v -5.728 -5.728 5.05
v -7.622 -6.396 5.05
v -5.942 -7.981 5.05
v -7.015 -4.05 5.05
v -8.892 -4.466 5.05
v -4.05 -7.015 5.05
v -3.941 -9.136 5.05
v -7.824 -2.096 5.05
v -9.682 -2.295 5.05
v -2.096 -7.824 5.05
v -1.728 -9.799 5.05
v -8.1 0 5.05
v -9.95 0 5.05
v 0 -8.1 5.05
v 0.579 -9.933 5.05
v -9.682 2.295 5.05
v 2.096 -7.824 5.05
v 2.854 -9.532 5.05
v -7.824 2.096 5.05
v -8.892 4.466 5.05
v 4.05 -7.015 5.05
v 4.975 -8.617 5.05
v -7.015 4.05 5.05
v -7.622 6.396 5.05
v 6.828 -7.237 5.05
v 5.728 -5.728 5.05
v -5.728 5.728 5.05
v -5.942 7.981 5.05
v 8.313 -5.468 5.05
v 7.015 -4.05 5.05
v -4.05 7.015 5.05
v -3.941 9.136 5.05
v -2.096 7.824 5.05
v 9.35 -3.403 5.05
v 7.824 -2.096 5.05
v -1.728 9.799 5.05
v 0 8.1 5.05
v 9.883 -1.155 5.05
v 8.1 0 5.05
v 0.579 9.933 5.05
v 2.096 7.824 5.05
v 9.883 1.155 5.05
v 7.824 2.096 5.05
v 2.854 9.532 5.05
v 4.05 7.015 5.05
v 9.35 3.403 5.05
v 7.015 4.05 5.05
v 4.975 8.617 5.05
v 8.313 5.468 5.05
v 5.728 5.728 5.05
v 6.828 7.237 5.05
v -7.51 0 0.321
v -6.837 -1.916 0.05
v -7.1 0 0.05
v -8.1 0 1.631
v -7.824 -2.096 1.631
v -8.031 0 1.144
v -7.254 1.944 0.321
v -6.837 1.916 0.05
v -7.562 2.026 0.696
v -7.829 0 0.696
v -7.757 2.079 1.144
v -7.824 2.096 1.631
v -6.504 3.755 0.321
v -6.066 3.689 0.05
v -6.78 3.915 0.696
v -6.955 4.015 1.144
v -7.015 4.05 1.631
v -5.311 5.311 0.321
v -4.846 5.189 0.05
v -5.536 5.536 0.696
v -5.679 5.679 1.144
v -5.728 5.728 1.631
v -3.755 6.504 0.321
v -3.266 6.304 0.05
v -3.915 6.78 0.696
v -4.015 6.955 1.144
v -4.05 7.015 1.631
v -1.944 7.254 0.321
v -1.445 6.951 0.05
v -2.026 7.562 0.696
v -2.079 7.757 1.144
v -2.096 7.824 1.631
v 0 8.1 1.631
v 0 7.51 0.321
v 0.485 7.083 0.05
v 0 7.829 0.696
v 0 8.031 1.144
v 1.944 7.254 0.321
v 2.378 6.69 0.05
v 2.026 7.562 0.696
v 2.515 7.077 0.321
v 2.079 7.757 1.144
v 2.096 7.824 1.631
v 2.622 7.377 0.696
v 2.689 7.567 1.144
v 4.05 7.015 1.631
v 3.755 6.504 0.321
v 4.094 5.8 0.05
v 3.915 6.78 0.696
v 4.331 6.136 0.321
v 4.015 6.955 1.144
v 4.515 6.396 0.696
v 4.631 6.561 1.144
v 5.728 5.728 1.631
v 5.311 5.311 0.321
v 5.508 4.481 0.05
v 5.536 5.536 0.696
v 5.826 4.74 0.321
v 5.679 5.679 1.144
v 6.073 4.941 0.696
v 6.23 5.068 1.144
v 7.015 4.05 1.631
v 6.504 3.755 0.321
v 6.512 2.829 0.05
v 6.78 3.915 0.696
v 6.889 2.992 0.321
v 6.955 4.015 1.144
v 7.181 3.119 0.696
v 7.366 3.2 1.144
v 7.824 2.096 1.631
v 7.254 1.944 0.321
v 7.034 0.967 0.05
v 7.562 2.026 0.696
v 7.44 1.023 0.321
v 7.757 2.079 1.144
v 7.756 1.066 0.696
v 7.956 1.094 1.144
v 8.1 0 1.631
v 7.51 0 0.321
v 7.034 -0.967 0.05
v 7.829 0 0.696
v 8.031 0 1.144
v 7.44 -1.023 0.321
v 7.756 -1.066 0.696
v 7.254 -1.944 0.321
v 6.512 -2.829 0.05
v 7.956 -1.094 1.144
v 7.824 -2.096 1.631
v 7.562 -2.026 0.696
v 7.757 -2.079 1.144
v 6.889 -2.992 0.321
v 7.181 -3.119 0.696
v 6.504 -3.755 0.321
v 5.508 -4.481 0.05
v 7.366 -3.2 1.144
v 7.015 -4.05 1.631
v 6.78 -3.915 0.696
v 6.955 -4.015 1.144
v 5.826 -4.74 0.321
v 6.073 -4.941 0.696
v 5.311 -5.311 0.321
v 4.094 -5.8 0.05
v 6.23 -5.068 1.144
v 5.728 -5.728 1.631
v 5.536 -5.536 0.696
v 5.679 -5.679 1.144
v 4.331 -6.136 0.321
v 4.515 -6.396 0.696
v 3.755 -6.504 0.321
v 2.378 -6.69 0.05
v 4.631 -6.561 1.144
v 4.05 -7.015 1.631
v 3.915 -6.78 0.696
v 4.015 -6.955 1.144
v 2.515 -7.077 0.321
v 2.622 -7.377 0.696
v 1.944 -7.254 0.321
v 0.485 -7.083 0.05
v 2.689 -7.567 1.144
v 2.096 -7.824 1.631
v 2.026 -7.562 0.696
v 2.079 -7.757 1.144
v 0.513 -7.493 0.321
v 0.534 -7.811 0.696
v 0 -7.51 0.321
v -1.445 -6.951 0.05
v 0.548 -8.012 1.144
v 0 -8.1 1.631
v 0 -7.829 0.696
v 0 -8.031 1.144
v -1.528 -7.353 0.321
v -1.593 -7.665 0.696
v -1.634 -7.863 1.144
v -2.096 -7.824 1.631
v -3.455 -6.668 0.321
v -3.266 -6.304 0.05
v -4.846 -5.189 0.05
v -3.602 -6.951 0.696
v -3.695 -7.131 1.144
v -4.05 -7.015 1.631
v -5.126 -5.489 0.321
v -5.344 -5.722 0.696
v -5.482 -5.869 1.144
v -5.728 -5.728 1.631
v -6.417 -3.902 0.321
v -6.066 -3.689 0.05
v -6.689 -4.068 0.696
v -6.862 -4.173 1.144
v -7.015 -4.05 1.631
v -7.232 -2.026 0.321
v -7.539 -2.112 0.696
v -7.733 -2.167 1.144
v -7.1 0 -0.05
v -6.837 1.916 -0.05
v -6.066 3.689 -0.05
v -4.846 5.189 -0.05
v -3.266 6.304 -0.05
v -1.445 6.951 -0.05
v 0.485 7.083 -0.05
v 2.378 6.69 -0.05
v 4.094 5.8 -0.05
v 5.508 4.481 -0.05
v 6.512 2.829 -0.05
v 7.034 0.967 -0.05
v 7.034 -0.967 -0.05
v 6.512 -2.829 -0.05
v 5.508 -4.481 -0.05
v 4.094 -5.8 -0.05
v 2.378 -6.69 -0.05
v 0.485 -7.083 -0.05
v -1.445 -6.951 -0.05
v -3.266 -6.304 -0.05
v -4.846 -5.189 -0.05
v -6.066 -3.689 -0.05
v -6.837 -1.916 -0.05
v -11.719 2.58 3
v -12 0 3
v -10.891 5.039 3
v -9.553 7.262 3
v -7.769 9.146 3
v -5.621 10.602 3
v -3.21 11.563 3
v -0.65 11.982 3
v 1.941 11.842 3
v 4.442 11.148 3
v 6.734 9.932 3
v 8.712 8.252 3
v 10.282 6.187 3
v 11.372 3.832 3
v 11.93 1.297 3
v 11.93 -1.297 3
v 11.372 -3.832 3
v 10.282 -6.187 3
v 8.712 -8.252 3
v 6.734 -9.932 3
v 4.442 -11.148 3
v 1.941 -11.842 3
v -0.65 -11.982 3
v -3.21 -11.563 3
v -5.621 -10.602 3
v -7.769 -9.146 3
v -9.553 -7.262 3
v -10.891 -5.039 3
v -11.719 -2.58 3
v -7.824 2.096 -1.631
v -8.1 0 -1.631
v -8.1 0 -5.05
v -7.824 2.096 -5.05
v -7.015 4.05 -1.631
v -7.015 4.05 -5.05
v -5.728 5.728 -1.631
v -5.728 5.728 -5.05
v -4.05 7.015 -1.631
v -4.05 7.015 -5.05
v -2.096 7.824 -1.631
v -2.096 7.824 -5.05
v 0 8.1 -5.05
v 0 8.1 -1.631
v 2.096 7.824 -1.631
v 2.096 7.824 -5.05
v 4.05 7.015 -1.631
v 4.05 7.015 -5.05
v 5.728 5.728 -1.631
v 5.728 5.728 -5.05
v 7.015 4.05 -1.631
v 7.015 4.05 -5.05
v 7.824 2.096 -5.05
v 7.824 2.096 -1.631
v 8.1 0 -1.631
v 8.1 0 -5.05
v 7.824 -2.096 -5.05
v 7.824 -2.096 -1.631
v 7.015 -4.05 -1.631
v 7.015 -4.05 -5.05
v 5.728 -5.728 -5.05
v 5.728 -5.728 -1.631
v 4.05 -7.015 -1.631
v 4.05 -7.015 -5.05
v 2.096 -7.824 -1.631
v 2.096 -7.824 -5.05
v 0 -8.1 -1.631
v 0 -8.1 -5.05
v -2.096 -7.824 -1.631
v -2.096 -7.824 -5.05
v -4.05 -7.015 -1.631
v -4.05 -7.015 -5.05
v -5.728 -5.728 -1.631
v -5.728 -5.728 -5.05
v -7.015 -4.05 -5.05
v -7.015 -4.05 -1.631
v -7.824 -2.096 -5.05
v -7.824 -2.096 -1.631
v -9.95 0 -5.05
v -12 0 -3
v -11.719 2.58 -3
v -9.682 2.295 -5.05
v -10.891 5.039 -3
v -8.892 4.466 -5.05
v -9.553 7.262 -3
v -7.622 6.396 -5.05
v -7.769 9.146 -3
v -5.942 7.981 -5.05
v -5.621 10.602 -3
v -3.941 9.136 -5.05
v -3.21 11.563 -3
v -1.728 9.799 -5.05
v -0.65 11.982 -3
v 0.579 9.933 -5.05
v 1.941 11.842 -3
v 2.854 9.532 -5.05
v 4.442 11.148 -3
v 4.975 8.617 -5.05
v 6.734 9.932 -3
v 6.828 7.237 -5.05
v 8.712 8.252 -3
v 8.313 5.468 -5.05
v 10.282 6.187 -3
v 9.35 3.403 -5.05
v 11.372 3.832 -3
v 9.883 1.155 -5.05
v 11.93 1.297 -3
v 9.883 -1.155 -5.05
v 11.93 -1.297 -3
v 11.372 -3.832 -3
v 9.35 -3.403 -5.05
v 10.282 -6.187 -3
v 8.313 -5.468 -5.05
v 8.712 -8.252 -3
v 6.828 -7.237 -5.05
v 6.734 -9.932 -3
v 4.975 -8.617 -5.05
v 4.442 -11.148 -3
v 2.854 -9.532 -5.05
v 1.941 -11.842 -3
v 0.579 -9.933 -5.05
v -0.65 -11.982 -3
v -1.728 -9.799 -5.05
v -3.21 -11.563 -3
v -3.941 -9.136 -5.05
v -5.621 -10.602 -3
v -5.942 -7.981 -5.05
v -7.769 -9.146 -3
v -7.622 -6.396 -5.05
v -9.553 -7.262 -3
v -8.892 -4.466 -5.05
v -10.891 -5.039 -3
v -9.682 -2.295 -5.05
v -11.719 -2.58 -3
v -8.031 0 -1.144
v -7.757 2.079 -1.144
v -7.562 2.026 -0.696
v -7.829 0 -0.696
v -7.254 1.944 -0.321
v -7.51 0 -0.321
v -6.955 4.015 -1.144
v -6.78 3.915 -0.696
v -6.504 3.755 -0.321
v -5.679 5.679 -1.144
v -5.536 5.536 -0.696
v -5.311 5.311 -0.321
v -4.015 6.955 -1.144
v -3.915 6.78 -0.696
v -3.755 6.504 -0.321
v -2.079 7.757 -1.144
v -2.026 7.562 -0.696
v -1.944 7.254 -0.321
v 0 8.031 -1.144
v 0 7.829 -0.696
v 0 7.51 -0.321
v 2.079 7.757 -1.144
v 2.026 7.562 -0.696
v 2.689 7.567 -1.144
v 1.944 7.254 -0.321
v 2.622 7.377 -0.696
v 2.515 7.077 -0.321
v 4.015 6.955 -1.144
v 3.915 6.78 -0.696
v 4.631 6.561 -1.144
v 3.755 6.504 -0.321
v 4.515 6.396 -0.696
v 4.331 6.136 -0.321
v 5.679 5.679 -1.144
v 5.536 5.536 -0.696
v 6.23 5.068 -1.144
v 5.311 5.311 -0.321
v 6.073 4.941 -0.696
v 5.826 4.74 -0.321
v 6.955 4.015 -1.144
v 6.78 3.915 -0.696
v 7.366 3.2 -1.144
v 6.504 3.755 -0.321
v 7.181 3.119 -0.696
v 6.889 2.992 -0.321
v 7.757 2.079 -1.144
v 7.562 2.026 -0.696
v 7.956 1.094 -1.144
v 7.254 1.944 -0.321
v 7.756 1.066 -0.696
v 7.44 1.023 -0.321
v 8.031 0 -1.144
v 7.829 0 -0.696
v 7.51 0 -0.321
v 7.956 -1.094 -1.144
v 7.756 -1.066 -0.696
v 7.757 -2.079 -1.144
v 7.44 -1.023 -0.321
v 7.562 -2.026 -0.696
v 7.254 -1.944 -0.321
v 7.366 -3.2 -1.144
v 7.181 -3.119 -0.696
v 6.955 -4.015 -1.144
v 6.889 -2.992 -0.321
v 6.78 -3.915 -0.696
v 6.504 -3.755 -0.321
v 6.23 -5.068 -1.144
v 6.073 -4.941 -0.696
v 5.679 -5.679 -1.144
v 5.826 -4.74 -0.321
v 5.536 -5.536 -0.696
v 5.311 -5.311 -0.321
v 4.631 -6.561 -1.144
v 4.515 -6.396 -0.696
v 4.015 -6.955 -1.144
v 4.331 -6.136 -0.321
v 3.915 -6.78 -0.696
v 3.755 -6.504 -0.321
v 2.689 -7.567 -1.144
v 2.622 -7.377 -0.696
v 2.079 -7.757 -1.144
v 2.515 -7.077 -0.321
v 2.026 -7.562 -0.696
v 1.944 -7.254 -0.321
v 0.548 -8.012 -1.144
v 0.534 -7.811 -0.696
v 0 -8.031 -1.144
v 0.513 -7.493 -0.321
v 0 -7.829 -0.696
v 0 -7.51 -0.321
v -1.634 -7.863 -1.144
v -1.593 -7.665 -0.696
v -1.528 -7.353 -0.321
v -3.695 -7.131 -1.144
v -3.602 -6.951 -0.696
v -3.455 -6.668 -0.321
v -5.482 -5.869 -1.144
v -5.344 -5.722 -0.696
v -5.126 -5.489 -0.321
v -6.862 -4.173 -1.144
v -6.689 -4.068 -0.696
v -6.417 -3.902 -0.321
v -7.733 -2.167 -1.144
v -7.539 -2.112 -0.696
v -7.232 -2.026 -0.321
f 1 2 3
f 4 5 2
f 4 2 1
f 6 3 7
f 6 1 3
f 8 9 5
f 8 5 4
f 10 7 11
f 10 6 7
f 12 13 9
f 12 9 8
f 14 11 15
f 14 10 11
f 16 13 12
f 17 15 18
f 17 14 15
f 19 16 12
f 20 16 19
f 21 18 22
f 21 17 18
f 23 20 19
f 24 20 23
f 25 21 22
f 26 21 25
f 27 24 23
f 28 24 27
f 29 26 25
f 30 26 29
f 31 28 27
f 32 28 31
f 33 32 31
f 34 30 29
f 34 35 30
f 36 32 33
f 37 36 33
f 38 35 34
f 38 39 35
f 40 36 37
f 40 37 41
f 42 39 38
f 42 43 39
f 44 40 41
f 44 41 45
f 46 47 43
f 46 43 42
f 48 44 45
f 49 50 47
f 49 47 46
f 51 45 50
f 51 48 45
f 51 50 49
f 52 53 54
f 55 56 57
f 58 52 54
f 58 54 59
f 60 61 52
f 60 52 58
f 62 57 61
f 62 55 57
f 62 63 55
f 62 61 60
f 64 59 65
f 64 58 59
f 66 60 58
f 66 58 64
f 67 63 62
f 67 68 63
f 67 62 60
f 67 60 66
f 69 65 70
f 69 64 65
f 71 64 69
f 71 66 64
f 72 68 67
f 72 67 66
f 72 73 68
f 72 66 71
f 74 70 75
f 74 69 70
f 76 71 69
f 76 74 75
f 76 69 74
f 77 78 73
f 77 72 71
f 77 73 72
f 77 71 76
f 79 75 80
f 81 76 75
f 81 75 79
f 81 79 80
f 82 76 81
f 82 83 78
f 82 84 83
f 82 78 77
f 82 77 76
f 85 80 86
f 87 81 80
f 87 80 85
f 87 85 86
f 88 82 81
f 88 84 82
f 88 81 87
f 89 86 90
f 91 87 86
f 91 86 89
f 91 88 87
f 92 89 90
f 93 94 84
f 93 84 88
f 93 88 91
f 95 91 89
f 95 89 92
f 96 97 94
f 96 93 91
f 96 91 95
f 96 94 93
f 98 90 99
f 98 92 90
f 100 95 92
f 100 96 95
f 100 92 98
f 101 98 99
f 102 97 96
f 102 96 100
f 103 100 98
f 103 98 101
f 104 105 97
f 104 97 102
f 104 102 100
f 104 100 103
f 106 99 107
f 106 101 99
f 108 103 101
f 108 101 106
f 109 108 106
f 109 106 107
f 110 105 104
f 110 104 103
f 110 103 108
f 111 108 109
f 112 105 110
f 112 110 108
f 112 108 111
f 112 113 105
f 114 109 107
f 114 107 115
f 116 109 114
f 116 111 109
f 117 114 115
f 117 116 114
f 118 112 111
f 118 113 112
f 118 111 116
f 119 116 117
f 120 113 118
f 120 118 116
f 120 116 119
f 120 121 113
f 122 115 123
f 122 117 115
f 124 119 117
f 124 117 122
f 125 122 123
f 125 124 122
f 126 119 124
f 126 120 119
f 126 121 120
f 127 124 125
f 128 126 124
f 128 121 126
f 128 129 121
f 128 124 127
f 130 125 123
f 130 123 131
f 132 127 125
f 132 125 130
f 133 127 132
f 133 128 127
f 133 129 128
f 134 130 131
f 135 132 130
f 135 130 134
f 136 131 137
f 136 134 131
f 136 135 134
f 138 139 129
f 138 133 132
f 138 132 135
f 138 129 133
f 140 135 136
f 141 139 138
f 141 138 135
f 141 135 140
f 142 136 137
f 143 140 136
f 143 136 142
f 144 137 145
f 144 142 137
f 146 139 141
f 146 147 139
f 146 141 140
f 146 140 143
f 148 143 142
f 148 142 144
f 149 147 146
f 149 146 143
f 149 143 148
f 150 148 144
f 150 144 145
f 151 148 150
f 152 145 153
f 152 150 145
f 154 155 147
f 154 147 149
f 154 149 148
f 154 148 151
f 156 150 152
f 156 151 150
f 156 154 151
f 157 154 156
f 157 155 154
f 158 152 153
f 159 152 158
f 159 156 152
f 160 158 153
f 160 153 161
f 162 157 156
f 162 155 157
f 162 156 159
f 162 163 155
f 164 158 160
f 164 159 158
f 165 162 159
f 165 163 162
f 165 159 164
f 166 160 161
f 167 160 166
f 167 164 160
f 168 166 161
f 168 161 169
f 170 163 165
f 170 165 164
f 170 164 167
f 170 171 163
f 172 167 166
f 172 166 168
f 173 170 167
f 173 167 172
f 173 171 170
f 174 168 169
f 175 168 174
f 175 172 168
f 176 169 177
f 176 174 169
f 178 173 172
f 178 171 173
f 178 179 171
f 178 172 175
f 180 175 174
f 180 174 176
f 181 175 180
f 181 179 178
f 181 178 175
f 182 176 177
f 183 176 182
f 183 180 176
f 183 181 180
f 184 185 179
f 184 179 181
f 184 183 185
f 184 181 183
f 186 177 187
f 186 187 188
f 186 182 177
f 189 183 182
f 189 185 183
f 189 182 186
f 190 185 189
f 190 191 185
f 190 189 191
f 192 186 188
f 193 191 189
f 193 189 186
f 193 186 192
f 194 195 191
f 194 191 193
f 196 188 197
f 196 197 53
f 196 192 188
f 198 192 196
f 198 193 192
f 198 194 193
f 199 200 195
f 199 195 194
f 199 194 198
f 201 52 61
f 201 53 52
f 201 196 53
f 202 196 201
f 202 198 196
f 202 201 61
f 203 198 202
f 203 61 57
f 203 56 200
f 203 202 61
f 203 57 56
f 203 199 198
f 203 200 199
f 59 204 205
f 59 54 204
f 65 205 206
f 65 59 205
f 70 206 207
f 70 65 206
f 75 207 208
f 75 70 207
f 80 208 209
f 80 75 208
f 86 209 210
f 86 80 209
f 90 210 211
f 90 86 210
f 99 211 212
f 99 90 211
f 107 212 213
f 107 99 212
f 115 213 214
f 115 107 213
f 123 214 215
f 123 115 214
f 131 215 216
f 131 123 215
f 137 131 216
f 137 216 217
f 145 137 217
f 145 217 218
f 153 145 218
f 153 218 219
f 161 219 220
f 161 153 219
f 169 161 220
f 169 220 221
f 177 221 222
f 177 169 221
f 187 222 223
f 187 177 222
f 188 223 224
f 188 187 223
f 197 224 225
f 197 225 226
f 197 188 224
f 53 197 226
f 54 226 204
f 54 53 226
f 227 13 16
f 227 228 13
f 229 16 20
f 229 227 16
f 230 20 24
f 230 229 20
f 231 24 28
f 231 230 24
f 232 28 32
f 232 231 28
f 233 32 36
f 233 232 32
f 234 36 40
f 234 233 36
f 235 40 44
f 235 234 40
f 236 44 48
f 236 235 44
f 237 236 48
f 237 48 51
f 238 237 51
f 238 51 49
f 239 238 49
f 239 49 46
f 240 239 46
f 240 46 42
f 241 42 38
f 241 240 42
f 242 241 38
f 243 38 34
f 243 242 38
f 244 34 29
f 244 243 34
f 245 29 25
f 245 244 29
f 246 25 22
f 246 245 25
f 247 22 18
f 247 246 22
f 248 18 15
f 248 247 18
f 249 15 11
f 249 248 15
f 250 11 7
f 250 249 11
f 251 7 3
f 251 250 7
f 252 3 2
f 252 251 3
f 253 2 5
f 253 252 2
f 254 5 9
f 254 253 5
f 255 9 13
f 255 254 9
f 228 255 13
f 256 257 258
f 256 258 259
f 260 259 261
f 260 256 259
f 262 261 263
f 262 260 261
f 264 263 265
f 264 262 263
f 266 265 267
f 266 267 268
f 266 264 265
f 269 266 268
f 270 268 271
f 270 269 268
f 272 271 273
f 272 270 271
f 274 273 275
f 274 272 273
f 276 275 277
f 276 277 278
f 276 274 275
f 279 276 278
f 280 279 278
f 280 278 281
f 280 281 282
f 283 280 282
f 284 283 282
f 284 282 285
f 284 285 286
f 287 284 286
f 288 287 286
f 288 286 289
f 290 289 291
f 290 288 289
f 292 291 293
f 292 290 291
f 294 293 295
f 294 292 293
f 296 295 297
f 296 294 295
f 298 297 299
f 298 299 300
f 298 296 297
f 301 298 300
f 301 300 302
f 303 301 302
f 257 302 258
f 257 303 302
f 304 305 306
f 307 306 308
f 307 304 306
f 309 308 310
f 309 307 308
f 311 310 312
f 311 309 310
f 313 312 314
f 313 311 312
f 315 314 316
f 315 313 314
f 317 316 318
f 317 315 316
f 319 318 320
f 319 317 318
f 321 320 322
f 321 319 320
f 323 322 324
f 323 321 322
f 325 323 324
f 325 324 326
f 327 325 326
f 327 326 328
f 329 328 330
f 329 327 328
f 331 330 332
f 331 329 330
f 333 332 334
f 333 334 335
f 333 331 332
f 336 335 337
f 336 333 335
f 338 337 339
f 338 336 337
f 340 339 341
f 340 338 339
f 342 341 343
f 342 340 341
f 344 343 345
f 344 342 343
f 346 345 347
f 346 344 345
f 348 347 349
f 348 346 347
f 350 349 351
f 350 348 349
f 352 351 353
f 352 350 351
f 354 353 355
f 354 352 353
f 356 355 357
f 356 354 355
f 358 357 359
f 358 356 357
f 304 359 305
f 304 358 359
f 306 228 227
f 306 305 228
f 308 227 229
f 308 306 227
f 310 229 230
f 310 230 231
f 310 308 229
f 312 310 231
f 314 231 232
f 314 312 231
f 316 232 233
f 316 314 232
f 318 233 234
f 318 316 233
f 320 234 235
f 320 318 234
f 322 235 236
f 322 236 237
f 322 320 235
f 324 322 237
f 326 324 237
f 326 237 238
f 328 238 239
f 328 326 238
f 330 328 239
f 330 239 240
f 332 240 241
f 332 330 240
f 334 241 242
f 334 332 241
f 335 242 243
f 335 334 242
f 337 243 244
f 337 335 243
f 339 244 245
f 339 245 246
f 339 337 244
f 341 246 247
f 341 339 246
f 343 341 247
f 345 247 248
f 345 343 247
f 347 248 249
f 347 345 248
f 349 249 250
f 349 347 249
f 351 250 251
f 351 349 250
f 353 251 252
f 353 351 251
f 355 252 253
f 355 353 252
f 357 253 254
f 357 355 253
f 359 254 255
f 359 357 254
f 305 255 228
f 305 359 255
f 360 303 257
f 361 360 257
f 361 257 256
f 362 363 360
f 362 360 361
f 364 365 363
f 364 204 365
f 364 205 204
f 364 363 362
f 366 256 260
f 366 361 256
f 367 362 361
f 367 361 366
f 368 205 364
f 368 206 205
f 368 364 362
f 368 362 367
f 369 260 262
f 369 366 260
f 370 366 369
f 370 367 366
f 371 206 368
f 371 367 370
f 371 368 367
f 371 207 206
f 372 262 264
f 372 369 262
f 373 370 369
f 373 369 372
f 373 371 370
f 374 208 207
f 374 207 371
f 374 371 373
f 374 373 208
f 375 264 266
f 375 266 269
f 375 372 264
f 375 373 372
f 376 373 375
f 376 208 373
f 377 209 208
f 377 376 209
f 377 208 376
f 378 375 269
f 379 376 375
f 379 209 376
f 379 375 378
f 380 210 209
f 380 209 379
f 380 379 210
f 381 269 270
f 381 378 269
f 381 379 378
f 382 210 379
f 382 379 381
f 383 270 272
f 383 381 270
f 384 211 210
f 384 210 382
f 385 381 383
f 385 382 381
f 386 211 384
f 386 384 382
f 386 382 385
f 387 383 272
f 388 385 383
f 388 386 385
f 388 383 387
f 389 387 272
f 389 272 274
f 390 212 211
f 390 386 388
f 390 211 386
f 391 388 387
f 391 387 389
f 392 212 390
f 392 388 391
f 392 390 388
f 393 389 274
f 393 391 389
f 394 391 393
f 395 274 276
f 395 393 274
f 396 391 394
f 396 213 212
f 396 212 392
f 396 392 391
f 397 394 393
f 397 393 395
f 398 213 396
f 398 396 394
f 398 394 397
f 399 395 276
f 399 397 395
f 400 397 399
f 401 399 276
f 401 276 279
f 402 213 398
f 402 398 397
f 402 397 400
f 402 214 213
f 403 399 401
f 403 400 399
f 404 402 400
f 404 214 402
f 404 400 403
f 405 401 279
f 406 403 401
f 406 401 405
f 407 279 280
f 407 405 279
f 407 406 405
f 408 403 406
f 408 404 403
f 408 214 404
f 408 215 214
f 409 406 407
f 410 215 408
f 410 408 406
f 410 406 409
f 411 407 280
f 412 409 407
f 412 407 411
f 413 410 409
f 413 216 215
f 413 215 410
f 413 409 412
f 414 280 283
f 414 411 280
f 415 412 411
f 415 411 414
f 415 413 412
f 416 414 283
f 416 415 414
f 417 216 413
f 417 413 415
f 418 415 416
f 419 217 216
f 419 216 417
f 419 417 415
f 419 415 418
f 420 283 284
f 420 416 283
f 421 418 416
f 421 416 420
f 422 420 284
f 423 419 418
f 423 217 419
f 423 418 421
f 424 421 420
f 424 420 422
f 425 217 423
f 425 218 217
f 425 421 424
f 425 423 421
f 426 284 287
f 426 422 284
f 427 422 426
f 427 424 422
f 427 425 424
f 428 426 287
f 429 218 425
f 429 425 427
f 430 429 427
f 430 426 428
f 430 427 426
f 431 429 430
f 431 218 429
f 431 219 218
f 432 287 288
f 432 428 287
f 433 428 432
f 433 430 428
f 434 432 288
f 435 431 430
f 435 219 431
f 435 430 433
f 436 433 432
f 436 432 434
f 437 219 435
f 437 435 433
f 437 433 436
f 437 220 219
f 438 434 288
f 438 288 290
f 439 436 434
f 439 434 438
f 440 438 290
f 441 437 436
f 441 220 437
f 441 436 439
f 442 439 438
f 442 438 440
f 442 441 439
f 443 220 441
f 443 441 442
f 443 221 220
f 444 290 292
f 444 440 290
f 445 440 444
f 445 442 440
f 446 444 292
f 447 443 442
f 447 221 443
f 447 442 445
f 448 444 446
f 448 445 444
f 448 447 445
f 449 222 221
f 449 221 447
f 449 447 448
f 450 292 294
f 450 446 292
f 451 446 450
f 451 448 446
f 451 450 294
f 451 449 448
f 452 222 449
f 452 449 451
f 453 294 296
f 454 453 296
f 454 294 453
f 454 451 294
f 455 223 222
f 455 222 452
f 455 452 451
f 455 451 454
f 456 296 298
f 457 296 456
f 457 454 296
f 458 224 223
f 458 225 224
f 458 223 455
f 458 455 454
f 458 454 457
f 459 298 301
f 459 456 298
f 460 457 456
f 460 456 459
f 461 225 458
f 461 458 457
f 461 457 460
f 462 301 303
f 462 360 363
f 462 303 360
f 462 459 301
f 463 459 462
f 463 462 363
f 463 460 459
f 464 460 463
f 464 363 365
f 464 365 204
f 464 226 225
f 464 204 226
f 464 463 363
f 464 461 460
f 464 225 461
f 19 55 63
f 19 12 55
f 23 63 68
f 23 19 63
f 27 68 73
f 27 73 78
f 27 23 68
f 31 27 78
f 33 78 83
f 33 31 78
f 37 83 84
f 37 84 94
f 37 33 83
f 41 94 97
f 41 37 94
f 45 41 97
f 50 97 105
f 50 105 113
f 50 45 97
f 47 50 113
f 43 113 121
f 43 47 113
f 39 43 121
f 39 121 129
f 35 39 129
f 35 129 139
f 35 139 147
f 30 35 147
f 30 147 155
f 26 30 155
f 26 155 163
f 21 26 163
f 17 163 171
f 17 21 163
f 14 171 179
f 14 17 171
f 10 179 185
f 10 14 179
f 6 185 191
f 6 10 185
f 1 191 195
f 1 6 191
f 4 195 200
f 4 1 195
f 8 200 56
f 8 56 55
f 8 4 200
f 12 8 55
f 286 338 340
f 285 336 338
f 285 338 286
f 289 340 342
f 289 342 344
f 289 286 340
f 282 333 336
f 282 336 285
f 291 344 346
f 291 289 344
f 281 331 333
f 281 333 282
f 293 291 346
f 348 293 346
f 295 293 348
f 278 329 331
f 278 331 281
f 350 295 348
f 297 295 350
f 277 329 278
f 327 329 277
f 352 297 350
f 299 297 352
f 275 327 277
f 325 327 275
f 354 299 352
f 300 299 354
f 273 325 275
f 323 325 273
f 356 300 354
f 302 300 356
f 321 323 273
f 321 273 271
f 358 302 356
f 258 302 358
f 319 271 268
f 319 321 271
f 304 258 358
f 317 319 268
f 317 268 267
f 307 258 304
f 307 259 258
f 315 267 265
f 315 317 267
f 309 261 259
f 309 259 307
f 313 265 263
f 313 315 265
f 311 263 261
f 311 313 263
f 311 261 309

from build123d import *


# Not quite as in the source:
# - a fillet or chamfer that OpenCascade refuses, or shapes differently, is made with other operations: its cross-section is extruded or revolved along the edge and cut away or added


with BuildPart() as f1:
    # F0 (on Front) → F1 (revolve)
    with BuildSketch(Plane.XZ):
        Polygon((-7.1, 0.05), (-8.1, 0.05), (-8.1, 5.05), (-9.95, 5.05), (-12, 3), (-12, -3), (-9.95, -5.05), (-8.1, -5.05), (-8.1, -0.05), (-7.1, -0.05), align=None)
    revolve(axis=Axis((0, 0, 10.9107699245), (0, 0, -1)))

    # F2: fillet of radius 1.75 on 2 edges, made by hand

    # F2_s1 → F2_t2 (revolve)
    with BuildSketch(Plane.XZ):
        with BuildLine():
            ThreePointArc((-8.1, -1.6311388301), (-7.8290199458, -0.6957244834), (-7.1, -0.05))
            Line((-7.1, -0.05), (-7.115, -0.0183772234))
            ThreePointArc((-7.115, -0.0183772234), (-7.6, -0.015), (-8.1, -0.015))
            Line((-8.1, -0.015), (-8.135, -0.05))
            Line((-8.135, -0.05), (-8.135, -1.6311388301))
            Line((-8.135, -1.6311388301), (-8.1, -1.6311388301))
        make_face()
    revolve(axis=Axis((0, 0, -0.05), (0, 0, -1)))

    # F2_s3 → F2_t4 (revolve)
    with BuildSketch(Plane.XZ):
        with BuildLine():
            ThreePointArc((-7.1, 0.05), (-7.8290199458, 0.6957244834), (-8.1, 1.6311388301))
            Line((-8.1, 1.6311388301), (-8.135, 1.6311388301))
            Line((-8.135, 1.6311388301), (-8.135, 0.05))
            Line((-8.135, 0.05), (-8.1, 0.015))
            ThreePointArc((-8.1, 0.015), (-7.6, 0.015), (-7.115, 0.0183772234))
            Line((-7.115, 0.0183772234), (-7.1, 0.05))
        make_face()
    revolve(axis=Axis((0, 0, 0.05), (0, 0, -1)))


solid = f1.part
